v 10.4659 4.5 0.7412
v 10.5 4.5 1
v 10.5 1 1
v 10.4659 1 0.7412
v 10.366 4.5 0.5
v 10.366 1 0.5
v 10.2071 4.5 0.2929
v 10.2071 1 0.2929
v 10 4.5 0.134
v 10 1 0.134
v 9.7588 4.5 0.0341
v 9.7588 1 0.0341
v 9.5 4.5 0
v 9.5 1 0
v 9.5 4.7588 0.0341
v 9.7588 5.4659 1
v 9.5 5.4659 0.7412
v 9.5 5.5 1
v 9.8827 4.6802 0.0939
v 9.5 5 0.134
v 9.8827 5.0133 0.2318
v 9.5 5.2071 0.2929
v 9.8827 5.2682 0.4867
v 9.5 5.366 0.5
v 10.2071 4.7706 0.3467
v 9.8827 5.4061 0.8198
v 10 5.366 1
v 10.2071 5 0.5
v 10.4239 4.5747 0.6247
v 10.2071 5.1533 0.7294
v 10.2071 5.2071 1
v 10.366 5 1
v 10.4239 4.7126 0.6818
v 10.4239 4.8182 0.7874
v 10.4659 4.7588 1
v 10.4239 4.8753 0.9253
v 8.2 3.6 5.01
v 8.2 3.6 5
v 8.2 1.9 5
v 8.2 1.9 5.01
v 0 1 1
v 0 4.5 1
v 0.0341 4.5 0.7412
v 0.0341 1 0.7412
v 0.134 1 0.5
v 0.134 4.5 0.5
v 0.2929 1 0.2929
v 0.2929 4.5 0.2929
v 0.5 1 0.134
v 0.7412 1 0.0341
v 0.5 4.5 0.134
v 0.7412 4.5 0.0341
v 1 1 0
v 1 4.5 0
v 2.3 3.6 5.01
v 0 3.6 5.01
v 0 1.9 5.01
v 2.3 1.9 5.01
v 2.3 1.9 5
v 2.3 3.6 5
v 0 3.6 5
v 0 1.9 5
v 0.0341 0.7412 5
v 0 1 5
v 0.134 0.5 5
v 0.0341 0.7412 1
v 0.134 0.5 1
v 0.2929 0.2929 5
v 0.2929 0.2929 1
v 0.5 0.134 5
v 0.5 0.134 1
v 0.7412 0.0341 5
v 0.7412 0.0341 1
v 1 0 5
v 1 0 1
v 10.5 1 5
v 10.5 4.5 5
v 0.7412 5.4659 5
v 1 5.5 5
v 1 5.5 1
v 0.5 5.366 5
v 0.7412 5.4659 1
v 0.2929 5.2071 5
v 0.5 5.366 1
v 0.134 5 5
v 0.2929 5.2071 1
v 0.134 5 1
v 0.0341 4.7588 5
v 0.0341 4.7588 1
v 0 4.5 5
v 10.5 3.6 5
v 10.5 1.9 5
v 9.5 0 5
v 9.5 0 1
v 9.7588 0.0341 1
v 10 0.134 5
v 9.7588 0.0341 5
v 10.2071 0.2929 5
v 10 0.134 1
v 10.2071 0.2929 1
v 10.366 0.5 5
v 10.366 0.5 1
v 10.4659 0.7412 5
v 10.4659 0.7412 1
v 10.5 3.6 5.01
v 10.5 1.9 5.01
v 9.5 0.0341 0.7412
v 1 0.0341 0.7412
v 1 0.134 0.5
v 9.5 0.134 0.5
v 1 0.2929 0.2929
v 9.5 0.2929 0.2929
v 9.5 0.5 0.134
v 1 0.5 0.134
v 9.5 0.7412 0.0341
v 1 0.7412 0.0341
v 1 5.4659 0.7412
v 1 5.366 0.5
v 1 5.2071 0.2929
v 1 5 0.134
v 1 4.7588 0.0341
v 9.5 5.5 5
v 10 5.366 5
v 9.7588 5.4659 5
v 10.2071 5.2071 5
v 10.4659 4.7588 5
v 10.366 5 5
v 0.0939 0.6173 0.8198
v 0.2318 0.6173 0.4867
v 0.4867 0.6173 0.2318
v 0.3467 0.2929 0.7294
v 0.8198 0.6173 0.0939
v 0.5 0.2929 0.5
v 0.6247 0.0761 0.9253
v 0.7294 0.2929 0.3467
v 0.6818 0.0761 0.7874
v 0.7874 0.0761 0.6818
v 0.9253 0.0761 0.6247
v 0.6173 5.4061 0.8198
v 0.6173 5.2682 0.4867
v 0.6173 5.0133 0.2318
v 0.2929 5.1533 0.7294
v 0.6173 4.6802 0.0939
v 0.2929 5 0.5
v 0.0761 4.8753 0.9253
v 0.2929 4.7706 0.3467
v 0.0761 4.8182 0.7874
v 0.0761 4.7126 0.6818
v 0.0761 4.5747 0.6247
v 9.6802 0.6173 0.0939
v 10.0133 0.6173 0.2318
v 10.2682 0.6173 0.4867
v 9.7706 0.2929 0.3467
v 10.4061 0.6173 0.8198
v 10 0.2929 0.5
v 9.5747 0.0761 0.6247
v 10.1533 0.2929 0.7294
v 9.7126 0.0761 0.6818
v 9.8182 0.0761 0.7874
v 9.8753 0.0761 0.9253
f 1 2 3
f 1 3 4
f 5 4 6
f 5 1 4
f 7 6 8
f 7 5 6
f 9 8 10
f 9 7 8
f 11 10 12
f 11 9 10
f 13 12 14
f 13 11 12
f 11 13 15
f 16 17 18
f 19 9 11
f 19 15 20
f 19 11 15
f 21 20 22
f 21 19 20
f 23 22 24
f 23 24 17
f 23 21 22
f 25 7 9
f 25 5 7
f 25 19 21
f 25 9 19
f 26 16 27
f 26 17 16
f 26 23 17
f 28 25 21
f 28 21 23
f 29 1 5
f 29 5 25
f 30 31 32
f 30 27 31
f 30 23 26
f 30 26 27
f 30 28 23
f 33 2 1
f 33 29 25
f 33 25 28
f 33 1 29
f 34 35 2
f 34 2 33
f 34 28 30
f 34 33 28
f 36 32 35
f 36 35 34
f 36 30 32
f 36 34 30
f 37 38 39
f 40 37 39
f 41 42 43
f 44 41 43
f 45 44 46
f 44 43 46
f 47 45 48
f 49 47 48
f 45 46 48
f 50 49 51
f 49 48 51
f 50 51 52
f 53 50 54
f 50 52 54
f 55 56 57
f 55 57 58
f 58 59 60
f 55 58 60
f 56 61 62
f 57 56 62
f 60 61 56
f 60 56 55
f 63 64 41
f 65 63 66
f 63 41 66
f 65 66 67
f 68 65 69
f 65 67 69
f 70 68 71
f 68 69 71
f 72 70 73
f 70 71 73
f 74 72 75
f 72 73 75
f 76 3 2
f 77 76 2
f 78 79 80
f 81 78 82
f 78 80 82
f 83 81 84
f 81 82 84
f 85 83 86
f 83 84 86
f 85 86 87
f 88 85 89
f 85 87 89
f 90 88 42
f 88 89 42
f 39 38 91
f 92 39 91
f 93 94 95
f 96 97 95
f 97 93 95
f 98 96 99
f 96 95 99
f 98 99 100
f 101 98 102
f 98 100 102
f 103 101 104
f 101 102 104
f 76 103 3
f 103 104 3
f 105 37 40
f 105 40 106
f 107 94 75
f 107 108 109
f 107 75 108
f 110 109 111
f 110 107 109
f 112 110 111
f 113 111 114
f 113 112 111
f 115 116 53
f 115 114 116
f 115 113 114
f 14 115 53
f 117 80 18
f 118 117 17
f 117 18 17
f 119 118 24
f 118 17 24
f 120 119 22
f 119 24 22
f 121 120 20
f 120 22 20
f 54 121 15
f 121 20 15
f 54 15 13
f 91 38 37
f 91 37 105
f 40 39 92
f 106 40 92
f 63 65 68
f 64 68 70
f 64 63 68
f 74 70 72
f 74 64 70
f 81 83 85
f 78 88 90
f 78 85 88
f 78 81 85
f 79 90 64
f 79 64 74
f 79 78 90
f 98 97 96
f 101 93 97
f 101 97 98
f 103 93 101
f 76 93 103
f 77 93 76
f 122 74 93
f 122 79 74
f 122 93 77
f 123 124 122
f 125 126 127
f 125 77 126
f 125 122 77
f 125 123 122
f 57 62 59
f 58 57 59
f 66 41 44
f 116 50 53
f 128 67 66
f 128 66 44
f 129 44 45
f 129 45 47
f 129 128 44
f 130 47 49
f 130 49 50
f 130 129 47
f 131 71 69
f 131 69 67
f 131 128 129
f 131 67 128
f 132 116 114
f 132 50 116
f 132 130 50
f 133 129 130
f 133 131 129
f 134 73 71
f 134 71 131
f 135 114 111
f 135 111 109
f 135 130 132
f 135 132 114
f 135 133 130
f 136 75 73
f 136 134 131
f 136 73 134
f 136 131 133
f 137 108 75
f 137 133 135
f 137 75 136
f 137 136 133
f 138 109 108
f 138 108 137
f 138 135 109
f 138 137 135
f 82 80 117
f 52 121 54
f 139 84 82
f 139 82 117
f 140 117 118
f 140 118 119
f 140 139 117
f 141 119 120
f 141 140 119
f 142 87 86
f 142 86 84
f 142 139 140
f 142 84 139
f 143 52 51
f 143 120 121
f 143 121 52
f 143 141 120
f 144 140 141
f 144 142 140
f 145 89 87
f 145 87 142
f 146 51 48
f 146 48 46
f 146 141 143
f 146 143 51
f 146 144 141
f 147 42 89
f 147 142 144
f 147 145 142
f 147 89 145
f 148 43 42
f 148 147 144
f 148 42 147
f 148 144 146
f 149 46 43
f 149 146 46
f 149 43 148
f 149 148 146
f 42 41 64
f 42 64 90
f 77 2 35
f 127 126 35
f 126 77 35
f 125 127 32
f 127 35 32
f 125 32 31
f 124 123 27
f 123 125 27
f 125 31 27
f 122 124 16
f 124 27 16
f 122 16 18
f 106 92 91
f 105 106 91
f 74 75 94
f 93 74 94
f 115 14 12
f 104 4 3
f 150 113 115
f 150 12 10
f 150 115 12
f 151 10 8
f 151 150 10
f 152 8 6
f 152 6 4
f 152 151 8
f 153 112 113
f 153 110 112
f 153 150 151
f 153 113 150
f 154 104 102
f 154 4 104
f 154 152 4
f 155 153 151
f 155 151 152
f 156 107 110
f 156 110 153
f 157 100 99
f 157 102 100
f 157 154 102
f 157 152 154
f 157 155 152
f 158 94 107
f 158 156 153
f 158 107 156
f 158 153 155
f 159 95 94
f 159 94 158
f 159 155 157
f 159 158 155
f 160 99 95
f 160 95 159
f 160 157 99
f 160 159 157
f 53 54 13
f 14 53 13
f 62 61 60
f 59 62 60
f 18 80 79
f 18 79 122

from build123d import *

# Parameters (mm, degrees)
SKETCH1_W           = 10.5
SKETCH1_H           = 5.5
BOSS_EXTRUDE1_DEPTH = 5
SKETCH2_W           = 2.3
SKETCH2_H           = 0.85
BOSS_EXTRUDE2_DEPTH = 0.01
FILLET1_R           = 1
FILLET2_R           = 1


with BuildPart() as part:
    # Sketch1 → Boss-Extrude1 (new body)
    with BuildSketch(Plane.XY):
        with Locations((5.25, 2.75)):
            Rectangle(SKETCH1_W, SKETCH1_H)
    extrude(amount=BOSS_EXTRUDE1_DEPTH)

    # Fillet1
    fillet1_edges = [part.edges().sort_by_distance(p)[0] for p in [
        (5.25, 5.5, 0),
        (10.5, 2.75, 0),
        (5.25, 0, 0),
        (0, 2.75, 0),
    ]]
    fillet(fillet1_edges, radius=FILLET1_R)

    # Fillet2
    # the kernel refuses this fillet: 1 mm, written as the material it takes off along each edge
    with BuildSketch(Plane(origin=(9.5, 4.5, 1), x_dir=(0, 1, 0), z_dir=(1, 0, 0))) as fillet2_piece_1_section:
        Polygon((0, 0), (FILLET2_R, 0), (FILLET2_R, -FILLET2_R), (0, -FILLET2_R), align=None)
    fillet2_piece_1 = extrude(amount=FILLET2_R, mode=Mode.PRIVATE)
    fillet2_piece_1 = fillet2_piece_1 - Plane(origin=(9.5, 4.5, 1), x_dir=(0, -0.7071067811865475, 0.7071067811865475), z_dir=(1, 0, 0)) * Sphere(FILLET2_R, mode=Mode.PRIVATE)
    add(fillet2_piece_1, mode=Mode.SUBTRACT)
    with BuildSketch(Plane(origin=(9.5, 1, 1), x_dir=(1, 0, 0), z_dir=(0, -1, 0))) as fillet2_piece_2_section:
        Polygon((0, 0), (FILLET2_R, 0), (FILLET2_R, -FILLET2_R), (0, -FILLET2_R), align=None)
    fillet2_piece_2 = extrude(amount=FILLET2_R, mode=Mode.PRIVATE)
    fillet2_piece_2 = fillet2_piece_2 - Plane(origin=(9.5, 1, 1), x_dir=(-0.7071067811865475, 0, 0.7071067811865475), z_dir=(0, -1, 0)) * Sphere(FILLET2_R, mode=Mode.PRIVATE)
    add(fillet2_piece_2, mode=Mode.SUBTRACT)
    with BuildSketch(Plane(origin=(1, 4.5, 1), x_dir=(0, 1, 0), z_dir=(-1, 0, 0))) as fillet2_piece_3_section:
        Polygon((0, 0), (FILLET2_R, 0), (FILLET2_R, FILLET2_R), (0, FILLET2_R), align=None)
    fillet2_piece_3 = extrude(amount=FILLET2_R, mode=Mode.PRIVATE)
    fillet2_piece_3 = fillet2_piece_3 - Plane(origin=(1, 4.5, 1), x_dir=(0, -0.7071067811865475, 0.7071067811865475), z_dir=(-1, 0, 0)) * Sphere(FILLET2_R, mode=Mode.PRIVATE)
    add(fillet2_piece_3, mode=Mode.SUBTRACT)
    with BuildSketch(Plane(origin=(1, 1, 1), x_dir=(-1, 0, 0), z_dir=(0, -1, 0))) as fillet2_piece_4_section:
        Polygon((0, 0), (FILLET2_R, 0), (FILLET2_R, FILLET2_R), (0, FILLET2_R), align=None)
    fillet2_piece_4 = extrude(amount=FILLET2_R, mode=Mode.PRIVATE)
    fillet2_piece_4 = fillet2_piece_4 - Plane(origin=(1, 1, 1), x_dir=(0.7071067811865475, 0, 0.7071067811865475), z_dir=(0, -1, 0)) * Sphere(FILLET2_R, mode=Mode.PRIVATE)
    add(fillet2_piece_4, mode=Mode.SUBTRACT)
    with BuildSketch(Plane(origin=(0, 5.5, 1), x_dir=(0, -1, 0), z_dir=(0, 0, 1)), Plane(origin=(0, 0, 1), x_dir=(1, 0, 0), z_dir=(0, 0, 1))) as fillet2_piece_5:
        with BuildLine():
            CenterArc((FILLET2_R, FILLET2_R), FILLET2_R, 180, 90)
            Line((0, FILLET2_R), (0, 0))
            Line((0, 0), (FILLET2_R, 0))
        make_face()
    extrude(amount=6.5, mode=Mode.SUBTRACT)
    with BuildSketch(Plane(origin=(10.5, 5.5, 1), x_dir=(0, -1, 0), z_dir=(0, 0, 1)), Plane(origin=(10.5, 0, 1), x_dir=(-1, 0, 0), z_dir=(0, 0, 1))) as fillet2_piece_6:
        with BuildLine():
            CenterArc((FILLET2_R, -FILLET2_R), FILLET2_R, 90, 90)
            Line((0, -FILLET2_R), (0, 0))
            Line((0, 0), (FILLET2_R, 0))
        make_face()
    extrude(amount=6.5, mode=Mode.SUBTRACT)


with BuildPart() as body_2:
    # Sketch2 → Boss-Extrude2 (new body)
    with BuildSketch(Plane.XY.offset(5)):
        with Locations((1.15, 3.175)):
            Rectangle(SKETCH2_W, SKETCH2_H)
        with Locations((1.15, 2.325)):
            Rectangle(SKETCH2_W, SKETCH2_H)
        with Locations((9.35, 3.175)):
            Rectangle(SKETCH2_W, SKETCH2_H)
        with Locations((9.35, 2.325)):
            Rectangle(SKETCH2_W, SKETCH2_H)
    extrude(amount=BOSS_EXTRUDE2_DEPTH)


solid = Compound([part.part, body_2.part])
